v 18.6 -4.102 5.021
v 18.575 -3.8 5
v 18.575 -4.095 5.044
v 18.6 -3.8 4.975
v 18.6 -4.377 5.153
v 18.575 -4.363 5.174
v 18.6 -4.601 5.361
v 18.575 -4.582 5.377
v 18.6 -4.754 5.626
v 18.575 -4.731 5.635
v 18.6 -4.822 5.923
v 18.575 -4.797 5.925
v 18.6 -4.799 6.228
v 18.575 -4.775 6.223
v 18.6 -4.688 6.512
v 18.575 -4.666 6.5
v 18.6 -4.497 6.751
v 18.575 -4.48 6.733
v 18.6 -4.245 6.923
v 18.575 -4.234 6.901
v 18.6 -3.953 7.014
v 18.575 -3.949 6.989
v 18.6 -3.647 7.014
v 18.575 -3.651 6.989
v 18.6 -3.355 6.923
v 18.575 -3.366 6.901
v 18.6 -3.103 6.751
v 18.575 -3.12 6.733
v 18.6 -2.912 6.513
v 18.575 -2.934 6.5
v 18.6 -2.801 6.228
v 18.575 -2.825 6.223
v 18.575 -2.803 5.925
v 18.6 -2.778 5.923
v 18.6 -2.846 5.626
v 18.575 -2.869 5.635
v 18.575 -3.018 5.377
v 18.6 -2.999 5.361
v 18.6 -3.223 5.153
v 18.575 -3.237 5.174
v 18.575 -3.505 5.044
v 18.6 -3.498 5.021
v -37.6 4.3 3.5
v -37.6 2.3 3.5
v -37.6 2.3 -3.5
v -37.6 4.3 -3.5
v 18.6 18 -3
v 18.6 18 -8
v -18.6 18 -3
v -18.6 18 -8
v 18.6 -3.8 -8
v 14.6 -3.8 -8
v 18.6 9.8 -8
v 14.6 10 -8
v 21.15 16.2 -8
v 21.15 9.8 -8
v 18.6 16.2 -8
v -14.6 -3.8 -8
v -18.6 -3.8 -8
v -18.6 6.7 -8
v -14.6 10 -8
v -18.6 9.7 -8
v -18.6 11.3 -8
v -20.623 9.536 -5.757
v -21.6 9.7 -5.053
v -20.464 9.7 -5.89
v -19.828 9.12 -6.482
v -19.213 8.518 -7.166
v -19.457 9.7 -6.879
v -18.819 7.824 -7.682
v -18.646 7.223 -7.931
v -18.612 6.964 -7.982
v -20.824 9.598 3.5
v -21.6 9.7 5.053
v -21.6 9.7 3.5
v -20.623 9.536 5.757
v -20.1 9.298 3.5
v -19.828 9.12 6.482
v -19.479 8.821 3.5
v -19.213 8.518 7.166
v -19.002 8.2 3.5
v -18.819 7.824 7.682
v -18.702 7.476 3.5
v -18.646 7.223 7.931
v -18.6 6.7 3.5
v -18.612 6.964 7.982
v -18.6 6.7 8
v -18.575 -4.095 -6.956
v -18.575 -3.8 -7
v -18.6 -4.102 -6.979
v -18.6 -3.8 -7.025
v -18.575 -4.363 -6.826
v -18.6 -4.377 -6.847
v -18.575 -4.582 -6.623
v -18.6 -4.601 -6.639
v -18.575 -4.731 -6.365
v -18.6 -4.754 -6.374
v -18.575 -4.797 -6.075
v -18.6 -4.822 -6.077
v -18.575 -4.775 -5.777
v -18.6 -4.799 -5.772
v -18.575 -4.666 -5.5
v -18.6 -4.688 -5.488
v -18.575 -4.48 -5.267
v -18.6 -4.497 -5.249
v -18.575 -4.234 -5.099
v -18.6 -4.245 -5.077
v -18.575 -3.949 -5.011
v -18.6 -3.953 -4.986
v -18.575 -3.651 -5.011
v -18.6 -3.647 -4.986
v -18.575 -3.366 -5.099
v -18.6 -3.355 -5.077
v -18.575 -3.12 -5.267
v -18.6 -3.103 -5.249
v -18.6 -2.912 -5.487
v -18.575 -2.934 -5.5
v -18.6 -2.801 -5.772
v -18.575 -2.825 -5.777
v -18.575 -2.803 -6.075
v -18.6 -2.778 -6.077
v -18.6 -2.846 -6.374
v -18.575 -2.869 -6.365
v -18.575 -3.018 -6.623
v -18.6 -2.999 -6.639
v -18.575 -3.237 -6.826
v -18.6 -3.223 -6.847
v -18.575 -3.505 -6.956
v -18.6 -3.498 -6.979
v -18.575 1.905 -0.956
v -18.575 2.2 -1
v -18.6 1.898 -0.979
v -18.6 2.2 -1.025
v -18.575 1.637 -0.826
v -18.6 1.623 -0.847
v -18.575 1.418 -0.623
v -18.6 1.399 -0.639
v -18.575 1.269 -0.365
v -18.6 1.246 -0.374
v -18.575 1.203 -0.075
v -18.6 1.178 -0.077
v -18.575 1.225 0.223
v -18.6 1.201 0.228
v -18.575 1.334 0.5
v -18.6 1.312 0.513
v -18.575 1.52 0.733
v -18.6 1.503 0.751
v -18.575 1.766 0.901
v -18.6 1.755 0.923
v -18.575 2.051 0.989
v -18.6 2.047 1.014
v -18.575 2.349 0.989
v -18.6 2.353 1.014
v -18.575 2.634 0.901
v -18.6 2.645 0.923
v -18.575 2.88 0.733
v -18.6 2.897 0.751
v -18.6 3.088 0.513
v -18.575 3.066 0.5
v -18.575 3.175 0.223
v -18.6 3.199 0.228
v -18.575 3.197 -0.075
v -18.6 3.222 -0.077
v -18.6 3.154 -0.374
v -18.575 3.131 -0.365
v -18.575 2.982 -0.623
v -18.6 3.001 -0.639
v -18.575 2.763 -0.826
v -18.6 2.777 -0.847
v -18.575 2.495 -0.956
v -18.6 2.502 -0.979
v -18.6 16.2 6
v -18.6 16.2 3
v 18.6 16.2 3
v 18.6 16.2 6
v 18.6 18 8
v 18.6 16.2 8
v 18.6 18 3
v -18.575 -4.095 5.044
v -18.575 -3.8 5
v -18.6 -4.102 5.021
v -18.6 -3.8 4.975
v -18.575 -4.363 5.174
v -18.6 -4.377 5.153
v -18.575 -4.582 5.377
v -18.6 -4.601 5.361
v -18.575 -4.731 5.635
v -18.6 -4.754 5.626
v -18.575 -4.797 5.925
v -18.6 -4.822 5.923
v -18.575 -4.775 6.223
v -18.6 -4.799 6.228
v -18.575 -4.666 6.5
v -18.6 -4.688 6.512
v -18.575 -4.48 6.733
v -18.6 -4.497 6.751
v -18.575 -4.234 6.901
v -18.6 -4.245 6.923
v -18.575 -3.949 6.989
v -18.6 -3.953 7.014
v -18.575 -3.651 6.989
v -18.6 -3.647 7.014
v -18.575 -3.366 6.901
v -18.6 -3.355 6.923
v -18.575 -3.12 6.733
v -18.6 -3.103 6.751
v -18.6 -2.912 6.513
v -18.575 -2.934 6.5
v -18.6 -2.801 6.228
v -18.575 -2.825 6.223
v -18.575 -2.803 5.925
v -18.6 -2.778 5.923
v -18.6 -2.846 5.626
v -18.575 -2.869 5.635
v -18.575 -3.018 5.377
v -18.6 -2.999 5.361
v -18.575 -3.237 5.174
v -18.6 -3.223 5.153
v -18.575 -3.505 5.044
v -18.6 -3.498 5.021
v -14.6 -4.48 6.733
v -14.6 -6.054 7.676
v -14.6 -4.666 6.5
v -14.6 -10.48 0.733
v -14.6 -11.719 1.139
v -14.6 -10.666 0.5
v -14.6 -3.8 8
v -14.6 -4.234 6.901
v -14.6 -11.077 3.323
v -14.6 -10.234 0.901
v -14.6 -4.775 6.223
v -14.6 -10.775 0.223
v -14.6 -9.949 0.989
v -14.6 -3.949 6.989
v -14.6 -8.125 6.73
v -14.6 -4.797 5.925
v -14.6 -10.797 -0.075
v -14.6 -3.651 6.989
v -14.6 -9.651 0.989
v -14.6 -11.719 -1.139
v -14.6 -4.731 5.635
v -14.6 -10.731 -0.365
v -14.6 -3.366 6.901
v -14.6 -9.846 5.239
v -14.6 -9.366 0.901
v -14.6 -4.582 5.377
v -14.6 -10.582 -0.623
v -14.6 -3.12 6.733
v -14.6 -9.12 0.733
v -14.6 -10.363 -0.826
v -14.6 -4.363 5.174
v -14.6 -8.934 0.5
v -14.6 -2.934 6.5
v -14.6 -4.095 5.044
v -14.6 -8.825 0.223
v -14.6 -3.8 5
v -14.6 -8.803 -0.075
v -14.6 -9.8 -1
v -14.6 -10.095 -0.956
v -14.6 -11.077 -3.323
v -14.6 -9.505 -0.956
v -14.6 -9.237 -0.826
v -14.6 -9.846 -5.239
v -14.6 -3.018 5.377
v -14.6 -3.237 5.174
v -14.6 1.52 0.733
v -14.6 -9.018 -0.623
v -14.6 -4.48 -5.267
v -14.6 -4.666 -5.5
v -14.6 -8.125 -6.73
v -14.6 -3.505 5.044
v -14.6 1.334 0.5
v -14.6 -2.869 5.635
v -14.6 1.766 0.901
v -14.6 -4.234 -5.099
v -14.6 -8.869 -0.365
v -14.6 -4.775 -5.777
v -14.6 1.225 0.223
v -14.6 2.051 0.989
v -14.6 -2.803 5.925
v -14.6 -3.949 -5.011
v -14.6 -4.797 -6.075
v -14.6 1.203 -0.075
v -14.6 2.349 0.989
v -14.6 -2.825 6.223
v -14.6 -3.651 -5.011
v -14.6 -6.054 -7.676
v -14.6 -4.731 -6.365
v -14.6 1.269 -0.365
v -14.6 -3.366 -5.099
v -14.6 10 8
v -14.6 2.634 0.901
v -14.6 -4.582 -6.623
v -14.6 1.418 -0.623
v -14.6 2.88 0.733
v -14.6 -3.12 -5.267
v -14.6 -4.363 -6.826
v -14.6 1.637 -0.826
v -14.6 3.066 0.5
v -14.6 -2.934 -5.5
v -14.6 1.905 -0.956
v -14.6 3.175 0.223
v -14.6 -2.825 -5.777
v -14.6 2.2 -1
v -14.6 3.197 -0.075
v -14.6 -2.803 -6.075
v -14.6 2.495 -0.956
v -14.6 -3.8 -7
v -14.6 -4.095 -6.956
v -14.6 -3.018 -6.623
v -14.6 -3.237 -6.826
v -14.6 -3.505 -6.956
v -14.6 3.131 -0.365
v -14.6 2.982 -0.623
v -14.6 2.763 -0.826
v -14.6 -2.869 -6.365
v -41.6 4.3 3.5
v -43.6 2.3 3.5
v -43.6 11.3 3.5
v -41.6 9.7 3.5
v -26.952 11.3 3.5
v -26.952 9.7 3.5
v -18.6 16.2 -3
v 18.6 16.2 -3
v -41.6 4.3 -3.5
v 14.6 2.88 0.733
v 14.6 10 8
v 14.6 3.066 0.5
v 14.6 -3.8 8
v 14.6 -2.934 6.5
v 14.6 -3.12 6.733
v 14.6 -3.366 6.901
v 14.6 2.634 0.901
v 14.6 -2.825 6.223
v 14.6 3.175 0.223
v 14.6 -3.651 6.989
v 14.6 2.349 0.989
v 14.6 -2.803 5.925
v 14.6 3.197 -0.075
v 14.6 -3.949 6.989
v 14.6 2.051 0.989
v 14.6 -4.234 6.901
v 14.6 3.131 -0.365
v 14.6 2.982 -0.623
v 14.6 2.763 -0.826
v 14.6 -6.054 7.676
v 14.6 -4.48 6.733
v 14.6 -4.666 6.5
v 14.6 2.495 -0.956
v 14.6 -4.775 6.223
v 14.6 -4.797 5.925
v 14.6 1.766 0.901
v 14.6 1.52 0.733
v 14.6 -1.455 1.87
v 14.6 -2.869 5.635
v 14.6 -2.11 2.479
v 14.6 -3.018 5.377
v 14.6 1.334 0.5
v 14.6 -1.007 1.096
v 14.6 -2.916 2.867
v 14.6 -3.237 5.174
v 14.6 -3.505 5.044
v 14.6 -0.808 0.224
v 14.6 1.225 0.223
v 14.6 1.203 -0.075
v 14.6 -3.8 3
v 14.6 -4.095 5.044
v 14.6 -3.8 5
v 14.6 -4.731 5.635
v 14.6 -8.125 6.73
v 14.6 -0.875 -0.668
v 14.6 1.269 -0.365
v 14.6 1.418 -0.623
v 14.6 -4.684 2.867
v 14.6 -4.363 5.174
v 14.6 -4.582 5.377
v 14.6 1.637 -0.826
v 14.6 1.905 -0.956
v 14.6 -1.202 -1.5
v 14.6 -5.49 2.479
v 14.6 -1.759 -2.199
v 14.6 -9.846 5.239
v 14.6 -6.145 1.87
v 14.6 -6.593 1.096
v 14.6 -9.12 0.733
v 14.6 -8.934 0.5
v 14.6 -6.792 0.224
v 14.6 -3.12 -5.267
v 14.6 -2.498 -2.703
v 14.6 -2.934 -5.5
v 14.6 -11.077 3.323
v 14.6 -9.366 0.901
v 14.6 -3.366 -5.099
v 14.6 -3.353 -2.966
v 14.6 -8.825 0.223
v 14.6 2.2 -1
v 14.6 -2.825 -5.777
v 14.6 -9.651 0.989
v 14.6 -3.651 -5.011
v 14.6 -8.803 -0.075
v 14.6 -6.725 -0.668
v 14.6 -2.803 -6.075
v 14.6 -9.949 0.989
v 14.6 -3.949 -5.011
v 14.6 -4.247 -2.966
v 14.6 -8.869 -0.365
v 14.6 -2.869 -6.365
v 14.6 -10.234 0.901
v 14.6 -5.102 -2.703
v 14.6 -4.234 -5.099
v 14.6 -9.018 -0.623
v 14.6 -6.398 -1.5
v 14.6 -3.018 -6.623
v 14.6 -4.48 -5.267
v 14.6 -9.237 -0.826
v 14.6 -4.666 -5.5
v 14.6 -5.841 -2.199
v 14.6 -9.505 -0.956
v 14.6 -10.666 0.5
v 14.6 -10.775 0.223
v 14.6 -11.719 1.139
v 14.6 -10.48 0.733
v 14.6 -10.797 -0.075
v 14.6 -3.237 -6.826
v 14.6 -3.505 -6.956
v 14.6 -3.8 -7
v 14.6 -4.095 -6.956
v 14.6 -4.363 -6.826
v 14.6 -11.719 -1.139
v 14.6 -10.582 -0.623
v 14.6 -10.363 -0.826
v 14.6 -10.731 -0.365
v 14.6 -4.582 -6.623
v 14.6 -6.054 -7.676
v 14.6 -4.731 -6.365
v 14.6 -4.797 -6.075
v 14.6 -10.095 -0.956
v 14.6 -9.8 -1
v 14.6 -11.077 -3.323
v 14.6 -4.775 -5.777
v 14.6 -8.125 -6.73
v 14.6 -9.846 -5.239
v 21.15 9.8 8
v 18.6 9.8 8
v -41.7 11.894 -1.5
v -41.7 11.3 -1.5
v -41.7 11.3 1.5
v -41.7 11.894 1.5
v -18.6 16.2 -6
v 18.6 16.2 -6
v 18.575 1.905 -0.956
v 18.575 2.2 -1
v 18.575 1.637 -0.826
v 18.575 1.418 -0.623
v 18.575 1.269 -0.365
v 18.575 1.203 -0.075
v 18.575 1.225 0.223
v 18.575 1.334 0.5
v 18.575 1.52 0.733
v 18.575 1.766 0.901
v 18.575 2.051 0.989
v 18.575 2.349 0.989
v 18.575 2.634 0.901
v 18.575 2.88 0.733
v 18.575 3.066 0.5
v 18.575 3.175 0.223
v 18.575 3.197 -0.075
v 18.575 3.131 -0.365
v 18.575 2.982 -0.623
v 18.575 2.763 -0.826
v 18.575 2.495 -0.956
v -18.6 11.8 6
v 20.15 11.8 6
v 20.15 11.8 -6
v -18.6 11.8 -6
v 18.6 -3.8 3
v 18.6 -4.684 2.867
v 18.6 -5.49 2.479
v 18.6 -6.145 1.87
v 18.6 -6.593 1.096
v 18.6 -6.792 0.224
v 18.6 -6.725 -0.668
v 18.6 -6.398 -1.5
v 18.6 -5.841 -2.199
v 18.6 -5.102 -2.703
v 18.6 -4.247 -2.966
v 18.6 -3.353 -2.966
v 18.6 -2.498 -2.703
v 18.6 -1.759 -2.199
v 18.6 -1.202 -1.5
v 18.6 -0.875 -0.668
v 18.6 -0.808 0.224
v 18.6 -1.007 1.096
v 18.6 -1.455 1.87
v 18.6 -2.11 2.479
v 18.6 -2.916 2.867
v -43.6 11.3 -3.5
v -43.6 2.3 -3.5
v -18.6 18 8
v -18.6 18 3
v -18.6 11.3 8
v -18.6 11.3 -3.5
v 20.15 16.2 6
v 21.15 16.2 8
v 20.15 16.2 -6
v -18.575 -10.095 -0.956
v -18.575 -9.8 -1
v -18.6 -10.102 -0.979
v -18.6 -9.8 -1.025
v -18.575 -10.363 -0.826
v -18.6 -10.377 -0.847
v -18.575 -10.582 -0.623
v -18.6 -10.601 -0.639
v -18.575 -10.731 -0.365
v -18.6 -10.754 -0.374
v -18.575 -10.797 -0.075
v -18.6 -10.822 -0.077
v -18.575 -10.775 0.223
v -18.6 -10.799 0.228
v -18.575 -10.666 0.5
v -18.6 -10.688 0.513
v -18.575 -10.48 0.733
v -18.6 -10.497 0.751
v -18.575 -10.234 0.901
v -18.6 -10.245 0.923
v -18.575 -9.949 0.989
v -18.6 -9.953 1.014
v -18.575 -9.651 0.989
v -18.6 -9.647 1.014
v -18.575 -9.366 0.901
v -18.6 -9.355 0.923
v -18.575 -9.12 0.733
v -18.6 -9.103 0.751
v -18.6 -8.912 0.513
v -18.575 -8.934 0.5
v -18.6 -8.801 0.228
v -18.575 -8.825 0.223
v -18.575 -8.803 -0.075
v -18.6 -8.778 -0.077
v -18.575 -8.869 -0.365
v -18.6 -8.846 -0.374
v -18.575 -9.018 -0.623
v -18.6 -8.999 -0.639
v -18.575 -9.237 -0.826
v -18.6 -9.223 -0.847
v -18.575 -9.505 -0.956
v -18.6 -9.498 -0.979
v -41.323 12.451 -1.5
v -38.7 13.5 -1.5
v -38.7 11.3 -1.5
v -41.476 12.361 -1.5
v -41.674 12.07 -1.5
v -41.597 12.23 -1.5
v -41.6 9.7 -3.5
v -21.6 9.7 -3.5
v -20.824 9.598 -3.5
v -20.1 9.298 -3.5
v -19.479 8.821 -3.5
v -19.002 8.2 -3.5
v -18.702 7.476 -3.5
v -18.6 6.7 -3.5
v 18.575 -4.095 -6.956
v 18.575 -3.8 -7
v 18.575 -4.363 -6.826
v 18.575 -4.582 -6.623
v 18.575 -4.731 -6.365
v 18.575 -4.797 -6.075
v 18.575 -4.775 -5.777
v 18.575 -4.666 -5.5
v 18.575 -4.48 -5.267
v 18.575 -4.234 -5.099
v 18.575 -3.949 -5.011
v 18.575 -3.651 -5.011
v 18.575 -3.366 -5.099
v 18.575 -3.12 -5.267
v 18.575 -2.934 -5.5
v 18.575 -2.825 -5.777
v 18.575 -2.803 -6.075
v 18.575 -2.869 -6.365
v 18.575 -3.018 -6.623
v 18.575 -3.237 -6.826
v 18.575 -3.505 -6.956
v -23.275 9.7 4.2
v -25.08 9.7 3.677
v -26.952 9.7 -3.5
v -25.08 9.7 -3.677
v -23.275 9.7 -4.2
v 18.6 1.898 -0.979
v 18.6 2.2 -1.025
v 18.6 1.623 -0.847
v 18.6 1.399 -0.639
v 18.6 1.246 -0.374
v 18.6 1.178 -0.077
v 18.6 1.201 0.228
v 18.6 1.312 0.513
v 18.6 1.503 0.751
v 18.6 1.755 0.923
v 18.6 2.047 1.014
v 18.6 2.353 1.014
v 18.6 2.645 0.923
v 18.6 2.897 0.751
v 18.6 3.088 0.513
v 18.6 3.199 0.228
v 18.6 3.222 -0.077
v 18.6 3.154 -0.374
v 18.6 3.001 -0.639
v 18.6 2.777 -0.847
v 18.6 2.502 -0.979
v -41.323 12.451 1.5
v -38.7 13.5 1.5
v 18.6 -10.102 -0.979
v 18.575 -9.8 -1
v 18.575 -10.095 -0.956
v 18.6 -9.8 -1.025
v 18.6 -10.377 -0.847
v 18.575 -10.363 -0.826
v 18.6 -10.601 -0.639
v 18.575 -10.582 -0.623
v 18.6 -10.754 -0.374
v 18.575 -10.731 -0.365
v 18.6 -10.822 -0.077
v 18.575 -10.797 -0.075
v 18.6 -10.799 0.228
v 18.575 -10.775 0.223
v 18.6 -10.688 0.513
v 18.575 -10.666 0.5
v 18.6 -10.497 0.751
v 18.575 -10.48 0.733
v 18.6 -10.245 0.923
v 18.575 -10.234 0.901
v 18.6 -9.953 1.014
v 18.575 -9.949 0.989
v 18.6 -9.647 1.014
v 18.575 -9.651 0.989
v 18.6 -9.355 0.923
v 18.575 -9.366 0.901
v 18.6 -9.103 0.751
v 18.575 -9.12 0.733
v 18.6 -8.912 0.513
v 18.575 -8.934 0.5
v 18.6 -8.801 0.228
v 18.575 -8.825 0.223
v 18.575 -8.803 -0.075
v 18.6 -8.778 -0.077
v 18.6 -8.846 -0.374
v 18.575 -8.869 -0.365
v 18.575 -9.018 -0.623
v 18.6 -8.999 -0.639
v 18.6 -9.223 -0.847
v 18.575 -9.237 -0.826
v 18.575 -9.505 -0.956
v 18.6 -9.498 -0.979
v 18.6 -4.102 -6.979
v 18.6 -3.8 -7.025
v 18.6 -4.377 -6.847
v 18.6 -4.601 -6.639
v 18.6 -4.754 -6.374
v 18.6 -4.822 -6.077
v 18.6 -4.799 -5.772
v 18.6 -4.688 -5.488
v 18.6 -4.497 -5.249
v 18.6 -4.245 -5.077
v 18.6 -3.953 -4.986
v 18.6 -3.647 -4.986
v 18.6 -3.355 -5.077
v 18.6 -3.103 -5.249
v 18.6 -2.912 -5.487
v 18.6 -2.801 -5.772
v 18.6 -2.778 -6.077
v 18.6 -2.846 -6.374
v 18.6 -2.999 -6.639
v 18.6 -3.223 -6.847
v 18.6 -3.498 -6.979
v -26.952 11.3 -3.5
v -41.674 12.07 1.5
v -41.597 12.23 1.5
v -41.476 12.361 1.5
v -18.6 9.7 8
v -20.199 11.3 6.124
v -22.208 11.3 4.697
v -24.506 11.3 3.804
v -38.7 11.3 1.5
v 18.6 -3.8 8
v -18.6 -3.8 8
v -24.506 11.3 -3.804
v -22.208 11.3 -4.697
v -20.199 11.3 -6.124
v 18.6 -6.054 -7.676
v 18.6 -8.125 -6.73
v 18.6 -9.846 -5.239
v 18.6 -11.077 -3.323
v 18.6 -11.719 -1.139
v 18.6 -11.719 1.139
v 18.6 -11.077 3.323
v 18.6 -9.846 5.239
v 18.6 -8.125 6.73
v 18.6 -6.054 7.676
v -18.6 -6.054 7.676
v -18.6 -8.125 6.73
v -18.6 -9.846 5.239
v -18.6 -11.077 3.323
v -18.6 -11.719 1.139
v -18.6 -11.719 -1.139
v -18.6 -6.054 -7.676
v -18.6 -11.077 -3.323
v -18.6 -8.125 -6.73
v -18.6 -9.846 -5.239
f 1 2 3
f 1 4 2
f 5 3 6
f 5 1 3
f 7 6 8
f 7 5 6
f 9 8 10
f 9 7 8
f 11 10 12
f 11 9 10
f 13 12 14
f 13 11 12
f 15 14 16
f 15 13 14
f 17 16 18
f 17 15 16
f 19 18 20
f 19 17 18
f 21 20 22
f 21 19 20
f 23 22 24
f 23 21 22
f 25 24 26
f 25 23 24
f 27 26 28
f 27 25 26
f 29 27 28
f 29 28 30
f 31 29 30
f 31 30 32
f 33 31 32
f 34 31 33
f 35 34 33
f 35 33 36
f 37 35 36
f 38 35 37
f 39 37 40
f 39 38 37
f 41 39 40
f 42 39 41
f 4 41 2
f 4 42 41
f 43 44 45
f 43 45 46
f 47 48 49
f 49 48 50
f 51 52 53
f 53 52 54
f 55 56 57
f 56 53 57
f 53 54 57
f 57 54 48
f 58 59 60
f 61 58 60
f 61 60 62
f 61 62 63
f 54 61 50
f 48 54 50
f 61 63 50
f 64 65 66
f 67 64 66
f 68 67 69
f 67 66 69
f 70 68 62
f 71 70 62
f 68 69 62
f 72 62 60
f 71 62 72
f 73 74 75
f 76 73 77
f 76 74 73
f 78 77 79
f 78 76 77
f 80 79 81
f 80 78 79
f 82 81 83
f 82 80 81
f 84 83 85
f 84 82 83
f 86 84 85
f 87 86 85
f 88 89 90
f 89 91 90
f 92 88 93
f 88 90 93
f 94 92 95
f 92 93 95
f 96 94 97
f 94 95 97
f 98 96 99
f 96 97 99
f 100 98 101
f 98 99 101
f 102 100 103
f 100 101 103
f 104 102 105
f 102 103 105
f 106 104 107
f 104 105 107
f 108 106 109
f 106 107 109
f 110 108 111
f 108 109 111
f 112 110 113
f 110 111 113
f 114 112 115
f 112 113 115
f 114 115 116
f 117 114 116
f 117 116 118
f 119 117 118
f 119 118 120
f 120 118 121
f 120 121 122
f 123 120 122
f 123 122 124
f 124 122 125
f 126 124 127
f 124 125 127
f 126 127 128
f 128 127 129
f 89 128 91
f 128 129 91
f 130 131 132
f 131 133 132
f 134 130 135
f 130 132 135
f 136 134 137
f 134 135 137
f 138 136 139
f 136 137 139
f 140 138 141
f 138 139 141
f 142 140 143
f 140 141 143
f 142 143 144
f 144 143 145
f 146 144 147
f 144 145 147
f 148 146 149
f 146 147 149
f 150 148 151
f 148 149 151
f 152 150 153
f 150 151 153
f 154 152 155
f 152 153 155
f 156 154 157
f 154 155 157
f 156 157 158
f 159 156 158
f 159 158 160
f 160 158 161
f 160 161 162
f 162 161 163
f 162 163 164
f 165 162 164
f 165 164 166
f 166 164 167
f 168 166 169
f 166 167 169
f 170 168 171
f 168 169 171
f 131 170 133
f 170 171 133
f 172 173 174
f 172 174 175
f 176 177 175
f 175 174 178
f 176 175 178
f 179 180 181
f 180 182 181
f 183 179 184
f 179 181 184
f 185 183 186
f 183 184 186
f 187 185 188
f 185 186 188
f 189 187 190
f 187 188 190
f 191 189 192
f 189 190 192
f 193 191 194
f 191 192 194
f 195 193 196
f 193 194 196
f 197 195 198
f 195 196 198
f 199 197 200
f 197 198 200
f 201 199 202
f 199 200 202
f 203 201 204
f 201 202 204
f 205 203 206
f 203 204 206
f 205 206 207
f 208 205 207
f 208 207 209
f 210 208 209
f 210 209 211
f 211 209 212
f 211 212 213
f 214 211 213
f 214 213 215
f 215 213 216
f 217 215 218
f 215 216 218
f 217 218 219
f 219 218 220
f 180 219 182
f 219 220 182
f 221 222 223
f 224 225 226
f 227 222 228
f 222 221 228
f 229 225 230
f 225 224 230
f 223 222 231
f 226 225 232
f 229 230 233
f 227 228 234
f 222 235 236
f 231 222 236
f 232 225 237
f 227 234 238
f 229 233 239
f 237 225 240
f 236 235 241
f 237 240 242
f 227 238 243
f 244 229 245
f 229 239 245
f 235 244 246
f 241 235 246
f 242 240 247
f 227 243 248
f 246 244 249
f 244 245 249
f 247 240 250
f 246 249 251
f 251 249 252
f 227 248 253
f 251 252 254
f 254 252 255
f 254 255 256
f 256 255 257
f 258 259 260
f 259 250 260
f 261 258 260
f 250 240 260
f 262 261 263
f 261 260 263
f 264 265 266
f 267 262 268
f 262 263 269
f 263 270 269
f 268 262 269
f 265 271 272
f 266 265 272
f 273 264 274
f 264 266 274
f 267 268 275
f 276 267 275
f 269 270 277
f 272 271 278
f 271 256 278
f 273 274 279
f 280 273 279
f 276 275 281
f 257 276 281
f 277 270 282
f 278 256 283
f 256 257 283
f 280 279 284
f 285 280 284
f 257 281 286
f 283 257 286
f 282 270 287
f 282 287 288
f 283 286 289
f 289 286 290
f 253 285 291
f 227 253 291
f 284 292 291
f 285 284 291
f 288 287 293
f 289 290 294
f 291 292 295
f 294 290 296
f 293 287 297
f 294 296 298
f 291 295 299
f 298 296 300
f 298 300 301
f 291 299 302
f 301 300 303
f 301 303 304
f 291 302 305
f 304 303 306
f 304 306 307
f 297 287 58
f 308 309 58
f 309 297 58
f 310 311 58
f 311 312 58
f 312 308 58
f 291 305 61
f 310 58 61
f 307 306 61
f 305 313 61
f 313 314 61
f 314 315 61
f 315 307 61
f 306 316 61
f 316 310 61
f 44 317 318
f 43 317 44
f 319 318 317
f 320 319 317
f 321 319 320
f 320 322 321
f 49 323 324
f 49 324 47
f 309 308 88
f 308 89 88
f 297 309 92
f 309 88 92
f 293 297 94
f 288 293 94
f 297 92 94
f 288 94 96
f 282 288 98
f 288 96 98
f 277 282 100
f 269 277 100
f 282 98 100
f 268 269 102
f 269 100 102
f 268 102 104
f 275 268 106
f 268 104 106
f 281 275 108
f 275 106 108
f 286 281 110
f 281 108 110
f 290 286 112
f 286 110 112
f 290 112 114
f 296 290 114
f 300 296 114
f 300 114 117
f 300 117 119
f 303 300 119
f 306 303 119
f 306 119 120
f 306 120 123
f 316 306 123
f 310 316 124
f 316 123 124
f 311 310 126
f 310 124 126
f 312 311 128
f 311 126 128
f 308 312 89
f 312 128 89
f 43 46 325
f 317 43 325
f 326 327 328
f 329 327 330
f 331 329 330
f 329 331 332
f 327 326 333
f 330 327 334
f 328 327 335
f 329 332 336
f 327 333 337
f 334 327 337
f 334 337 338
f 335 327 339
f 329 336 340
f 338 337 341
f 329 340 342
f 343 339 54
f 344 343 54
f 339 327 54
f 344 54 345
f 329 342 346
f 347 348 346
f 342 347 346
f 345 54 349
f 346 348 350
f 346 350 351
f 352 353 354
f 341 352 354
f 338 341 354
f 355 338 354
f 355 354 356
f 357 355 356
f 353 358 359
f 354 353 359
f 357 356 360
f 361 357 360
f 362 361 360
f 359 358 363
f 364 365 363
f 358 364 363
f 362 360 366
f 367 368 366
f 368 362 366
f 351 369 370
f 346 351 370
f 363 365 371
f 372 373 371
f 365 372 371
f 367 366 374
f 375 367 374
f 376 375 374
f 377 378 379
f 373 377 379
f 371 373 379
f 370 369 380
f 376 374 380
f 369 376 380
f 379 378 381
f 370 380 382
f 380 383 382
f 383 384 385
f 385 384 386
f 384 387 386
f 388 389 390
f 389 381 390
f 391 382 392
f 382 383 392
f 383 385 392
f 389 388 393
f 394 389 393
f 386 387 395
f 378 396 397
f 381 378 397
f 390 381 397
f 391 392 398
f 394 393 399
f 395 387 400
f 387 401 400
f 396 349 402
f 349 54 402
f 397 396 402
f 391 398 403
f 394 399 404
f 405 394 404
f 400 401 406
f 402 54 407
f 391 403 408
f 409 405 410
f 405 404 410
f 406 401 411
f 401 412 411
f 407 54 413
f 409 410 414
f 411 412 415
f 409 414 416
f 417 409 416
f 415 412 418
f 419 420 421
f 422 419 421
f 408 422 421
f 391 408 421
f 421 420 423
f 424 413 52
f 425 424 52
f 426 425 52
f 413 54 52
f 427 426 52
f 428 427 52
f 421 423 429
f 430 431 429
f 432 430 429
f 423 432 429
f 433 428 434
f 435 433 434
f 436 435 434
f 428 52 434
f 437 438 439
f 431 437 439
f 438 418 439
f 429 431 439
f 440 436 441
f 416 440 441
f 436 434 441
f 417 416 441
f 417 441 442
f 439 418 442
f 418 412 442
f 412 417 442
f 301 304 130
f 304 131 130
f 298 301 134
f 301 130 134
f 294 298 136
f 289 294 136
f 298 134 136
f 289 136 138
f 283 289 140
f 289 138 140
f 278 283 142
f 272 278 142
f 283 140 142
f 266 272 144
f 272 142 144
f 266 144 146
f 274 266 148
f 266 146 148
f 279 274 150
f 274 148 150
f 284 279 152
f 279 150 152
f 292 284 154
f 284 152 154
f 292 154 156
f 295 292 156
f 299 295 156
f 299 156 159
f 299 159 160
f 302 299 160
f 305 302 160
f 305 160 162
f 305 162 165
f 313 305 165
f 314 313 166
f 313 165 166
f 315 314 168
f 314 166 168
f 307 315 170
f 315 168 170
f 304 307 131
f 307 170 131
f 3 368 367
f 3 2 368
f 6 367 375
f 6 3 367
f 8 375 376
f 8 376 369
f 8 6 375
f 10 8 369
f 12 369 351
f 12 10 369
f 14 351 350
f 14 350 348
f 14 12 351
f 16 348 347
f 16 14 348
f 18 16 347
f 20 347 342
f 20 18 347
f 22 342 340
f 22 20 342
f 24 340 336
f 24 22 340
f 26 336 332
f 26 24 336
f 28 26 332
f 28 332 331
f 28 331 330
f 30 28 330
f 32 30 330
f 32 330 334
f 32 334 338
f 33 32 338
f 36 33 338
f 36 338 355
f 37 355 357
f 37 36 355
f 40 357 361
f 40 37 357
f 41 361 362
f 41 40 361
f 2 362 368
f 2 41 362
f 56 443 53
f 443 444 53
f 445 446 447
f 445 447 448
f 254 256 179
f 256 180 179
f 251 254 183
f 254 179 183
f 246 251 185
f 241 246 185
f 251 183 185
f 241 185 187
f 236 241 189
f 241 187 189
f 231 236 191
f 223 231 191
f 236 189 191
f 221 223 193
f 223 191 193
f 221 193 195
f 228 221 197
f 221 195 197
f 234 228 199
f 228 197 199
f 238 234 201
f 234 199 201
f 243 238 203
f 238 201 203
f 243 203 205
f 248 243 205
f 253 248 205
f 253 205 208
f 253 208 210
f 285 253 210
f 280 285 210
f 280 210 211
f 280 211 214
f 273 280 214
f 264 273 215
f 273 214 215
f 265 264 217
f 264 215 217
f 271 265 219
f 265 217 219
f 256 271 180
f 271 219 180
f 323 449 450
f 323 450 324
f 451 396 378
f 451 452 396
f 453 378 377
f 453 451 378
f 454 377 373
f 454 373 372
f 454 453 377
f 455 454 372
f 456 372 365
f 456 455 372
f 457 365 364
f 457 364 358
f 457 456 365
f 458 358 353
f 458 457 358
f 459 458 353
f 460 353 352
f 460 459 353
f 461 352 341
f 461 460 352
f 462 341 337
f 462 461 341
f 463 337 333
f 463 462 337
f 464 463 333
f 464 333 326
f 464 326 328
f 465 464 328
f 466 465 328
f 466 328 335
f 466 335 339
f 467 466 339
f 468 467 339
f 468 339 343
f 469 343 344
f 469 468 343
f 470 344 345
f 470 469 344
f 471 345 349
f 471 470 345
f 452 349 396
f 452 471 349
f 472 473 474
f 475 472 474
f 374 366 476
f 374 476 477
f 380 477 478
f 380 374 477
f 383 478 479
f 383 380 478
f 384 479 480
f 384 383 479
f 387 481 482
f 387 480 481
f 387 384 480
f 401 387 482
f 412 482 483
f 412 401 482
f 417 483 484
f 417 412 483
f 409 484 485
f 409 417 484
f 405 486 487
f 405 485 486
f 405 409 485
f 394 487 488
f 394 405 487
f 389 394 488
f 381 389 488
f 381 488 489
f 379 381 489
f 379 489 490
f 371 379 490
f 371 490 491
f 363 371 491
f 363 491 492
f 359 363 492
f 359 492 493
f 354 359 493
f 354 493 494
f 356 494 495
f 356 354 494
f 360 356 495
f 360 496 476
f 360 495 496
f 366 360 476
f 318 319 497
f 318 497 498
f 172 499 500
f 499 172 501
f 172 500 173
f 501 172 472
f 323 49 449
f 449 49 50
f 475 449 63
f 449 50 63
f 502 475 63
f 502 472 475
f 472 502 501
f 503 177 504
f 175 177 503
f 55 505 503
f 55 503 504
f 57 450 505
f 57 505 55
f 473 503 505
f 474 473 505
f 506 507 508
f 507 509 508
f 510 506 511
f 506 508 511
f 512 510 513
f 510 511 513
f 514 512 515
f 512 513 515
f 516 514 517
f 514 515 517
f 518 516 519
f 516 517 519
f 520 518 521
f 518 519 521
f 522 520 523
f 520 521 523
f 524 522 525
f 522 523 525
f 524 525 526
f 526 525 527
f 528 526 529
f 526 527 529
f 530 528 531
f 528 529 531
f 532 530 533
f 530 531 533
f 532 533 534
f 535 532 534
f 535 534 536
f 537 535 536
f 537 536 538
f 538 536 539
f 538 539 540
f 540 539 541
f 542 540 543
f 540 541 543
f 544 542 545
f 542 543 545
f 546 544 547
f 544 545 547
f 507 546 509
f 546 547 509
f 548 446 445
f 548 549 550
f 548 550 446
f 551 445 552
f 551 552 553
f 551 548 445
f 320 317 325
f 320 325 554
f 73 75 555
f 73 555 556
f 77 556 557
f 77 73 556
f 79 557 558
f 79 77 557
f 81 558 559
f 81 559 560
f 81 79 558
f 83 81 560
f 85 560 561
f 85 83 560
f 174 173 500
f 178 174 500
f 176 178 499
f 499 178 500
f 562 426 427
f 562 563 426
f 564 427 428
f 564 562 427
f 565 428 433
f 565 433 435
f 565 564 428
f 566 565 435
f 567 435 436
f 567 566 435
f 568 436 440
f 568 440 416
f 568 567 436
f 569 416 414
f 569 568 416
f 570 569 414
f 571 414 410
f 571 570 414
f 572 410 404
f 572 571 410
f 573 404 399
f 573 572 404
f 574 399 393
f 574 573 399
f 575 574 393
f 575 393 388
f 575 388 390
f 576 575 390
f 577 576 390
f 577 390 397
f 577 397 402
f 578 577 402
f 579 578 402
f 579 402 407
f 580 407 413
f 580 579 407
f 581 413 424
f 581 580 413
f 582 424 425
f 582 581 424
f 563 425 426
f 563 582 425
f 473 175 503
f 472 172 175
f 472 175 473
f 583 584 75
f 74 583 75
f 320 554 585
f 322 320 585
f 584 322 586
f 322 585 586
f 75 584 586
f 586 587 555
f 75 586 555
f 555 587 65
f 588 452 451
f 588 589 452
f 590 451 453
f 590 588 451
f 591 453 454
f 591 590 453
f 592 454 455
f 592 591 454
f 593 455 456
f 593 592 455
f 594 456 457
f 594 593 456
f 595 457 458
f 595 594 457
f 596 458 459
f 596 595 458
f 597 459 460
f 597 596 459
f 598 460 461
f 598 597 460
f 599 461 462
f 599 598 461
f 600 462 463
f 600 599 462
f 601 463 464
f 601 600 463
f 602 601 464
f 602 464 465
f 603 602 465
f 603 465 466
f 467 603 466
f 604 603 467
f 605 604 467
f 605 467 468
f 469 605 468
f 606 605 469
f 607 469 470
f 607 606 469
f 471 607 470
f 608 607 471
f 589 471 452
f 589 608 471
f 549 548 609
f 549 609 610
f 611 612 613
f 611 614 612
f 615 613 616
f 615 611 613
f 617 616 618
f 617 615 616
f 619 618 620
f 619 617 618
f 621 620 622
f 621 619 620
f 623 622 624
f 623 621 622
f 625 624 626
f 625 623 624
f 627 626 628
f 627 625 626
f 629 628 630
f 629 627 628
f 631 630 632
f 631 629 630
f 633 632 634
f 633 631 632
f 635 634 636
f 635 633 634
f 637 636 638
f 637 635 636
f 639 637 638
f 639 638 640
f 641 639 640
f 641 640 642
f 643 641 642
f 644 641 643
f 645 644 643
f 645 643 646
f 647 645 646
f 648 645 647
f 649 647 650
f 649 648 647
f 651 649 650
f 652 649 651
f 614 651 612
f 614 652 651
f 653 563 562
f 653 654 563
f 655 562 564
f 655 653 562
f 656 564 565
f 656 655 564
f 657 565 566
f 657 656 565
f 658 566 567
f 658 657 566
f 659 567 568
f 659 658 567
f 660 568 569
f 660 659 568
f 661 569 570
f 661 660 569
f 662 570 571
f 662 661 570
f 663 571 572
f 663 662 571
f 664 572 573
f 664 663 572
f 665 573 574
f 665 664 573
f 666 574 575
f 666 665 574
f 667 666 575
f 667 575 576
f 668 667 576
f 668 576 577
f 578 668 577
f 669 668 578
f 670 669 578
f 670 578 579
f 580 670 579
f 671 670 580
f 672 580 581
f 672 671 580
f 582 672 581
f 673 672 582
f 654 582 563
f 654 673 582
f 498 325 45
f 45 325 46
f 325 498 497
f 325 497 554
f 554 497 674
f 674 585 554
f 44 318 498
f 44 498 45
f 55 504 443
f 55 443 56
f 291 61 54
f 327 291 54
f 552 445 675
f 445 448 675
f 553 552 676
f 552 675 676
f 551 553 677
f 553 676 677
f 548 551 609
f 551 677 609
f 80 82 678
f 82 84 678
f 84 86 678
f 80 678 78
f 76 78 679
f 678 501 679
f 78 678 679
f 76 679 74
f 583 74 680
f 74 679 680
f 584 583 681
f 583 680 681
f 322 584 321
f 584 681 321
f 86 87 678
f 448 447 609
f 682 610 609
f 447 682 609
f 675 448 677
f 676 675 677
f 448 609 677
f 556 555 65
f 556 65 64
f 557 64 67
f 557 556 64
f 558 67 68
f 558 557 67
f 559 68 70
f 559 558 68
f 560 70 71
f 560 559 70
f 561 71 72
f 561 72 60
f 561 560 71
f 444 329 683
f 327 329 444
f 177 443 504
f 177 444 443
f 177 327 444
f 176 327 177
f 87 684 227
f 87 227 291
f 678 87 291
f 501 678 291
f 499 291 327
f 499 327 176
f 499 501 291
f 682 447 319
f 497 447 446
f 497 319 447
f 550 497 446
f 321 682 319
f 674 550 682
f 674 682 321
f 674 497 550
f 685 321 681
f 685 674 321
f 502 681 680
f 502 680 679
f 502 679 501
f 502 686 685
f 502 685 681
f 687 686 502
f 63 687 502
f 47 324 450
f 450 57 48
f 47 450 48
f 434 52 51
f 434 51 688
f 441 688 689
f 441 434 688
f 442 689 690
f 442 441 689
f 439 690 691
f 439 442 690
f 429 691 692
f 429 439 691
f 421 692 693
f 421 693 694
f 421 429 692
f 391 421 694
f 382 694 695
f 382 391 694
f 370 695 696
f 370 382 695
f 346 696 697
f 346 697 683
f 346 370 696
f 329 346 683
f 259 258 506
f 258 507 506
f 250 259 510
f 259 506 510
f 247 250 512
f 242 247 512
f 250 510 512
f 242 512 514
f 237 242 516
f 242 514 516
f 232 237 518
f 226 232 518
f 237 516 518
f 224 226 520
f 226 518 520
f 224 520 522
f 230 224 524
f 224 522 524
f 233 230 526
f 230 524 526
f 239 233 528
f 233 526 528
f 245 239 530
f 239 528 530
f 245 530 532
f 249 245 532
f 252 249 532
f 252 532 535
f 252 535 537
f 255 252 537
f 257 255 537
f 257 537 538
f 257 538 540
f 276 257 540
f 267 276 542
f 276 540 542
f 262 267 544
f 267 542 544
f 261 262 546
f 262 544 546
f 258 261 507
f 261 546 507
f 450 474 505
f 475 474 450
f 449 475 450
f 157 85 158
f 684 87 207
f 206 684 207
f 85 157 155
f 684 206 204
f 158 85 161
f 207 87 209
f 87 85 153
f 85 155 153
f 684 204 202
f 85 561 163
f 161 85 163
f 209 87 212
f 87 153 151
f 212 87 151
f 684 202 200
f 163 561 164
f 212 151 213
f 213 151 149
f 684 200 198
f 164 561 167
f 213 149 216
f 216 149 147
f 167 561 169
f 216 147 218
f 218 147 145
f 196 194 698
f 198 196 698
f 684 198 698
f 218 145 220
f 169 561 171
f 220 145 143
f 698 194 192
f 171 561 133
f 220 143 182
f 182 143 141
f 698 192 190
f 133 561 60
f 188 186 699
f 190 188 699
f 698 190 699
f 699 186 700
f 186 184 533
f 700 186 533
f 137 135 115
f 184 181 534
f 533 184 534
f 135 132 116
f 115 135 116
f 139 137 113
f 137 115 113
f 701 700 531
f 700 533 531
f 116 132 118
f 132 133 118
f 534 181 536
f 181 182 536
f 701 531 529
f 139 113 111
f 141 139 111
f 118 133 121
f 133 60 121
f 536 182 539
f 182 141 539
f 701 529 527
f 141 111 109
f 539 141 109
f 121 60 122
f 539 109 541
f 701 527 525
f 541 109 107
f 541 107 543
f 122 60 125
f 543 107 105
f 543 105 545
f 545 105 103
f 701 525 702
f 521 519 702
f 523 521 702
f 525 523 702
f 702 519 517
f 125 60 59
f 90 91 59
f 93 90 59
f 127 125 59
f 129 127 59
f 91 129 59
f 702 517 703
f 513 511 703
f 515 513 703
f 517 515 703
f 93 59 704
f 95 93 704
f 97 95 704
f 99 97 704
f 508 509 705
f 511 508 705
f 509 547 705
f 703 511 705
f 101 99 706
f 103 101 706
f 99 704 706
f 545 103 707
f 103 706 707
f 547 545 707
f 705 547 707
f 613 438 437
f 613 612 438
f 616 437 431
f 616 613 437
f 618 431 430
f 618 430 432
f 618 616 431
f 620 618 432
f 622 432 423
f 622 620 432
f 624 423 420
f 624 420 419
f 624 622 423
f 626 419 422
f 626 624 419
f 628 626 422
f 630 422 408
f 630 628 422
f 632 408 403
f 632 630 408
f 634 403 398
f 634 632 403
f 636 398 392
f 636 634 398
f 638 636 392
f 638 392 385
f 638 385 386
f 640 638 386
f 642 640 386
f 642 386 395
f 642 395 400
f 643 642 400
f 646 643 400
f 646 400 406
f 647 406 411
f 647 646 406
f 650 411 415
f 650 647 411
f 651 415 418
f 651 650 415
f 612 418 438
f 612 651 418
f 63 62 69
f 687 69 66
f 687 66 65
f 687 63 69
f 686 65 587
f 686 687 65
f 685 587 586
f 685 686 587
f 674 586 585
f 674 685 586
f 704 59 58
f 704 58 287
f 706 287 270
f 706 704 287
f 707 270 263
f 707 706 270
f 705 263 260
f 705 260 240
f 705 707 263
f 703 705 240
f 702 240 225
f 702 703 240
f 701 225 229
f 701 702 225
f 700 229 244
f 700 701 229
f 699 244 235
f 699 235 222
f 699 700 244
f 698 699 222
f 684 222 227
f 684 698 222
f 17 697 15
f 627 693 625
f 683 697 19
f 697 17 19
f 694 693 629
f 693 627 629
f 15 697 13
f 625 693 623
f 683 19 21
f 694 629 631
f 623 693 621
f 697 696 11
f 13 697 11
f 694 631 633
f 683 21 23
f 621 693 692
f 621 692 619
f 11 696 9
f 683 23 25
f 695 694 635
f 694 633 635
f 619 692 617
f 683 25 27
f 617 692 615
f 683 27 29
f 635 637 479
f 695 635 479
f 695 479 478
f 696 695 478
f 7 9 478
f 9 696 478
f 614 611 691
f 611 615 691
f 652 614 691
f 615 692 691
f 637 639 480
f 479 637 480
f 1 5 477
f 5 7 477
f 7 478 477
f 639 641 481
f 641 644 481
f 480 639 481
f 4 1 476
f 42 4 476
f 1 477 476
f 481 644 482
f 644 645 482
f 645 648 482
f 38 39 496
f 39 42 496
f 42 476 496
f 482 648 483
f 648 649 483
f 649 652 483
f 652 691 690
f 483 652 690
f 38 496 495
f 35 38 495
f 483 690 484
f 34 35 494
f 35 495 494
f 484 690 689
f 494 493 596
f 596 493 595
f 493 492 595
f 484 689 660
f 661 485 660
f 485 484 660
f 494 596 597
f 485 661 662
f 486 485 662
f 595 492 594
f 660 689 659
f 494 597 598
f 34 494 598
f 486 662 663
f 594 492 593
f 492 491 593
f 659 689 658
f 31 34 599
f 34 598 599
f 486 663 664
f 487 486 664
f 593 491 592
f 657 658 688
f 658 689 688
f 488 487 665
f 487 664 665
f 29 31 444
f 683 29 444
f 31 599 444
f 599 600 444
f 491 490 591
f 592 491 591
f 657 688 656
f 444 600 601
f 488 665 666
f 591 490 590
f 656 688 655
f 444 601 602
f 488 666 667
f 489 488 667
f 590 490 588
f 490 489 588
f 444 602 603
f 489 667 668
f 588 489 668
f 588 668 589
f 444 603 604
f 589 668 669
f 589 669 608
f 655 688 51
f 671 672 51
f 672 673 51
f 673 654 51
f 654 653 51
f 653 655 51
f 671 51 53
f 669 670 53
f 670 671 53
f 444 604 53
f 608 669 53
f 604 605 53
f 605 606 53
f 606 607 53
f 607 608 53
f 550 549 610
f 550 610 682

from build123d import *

# Parameters (mm, degrees)
BOSS_EXTRUDE1_DEPTH             = 8
BOSS_EXTRUDE1_DEPTH_BACK        = 8
M1_6_CLEARANCE_HOLE1_AT_2_COUNT = 2
M1_6_CLEARANCE_HOLE1_AT_2_PITCH = 8.485281374
M1_6_CLEARANCE_HOLE1_AT_3_COUNT = 2
M1_6_CLEARANCE_HOLE1_AT_3_PITCH = 12
M1_6_CLEARANCE_HOLE1_AT_4_COUNT = 2
M1_6_CLEARANCE_HOLE1_AT_4_PITCH = 8.485281374
CUT_EXTRUDE1_DEPTH              = 43.093229859
CUT_EXTRUDE1_DEPTH_BACK         = 43.093229859
CUT_EXTRUDE2_DEPTH              = 43.093229859
CUT_EXTRUDE2_DEPTH_BACK         = 43.093229859
SKETCH6_W                       = 6
SKETCH6_H                       = 1.8
SKETCH6_W_2                     = 12
SKETCH6_H_2                     = 4.4
BOSS_EXTRUDE2_START             = -0.5
SKETCH8_W                       = 23
SKETCH8_H                       = 7
BOSS_EXTRUDE2_DEPTH             = 1.6
BOSS_EXTRUDE3_DEPTH             = 7
BOSS_EXTRUDE4_DEPTH             = 1.55
SKETCH13_W                      = 16
SKETCH13_H                      = 6.4
BOSS_EXTRUDE5_DEPTH             = 1
BOSS_EXTRUDE6_DEPTH             = 1.5
BOSS_EXTRUDE6_DEPTH_BACK        = 1.5
FILLET1_R                       = 0.6
FILLET2_R                       = 10
FILLET3_R                       = 3
CUT_EXTRUDE3_DEPTH              = 66.244463379
CUT_EXTRUDE3_DEPTH_BACK         = 10
SKETCH16_R                      = 3


with BuildPart() as part:
    # Sketch1 → Boss-Extrude1 (new, two sides: drawn at the far end of the back side and taken through both)
    with BuildSketch(Plane.XY.offset(-BOSS_EXTRUDE1_DEPTH_BACK)):
        Polygon((18.6, 18), (-18.6, 18), (-18.6, -18), (-14.6, -18), (-14.6, 10), (14.6, 10), (14.6, -18), (18.6, -18), align=None)
    extrude(amount=BOSS_EXTRUDE1_DEPTH + BOSS_EXTRUDE1_DEPTH_BACK)

    # Sketch4 → M1.6 Clearance Hole1 (revolve, cut)
    with BuildSketch(Plane(origin=(18.6, -3.8, 6), x_dir=(0, 0, -1), z_dir=(0, 1, 0))):
        Polygon((0, 0), (0, 4.600860619), (1, 4), (1, 0.025), (1.025, 0), align=None)
    m1_6_clearance_hole1 = revolve(axis=Axis((24.95, -3.8, 6), (-1, 0, 0)), mode=Mode.SUBTRACT)

    # M1.6 Clearance Hole1 at 2: M1.6 Clearance Hole1 ×2
    with Locations(*[Vector(0, 0.7071067811865476, -0.7071067811865476) * (i * M1_6_CLEARANCE_HOLE1_AT_2_PITCH) for i in range(1, M1_6_CLEARANCE_HOLE1_AT_2_COUNT)]):
        add(m1_6_clearance_hole1, mode=Mode.SUBTRACT)

    # M1.6 Clearance Hole1 at 3: M1.6 Clearance Hole1 ×2
    with Locations(*[(0, 0, -i * M1_6_CLEARANCE_HOLE1_AT_3_PITCH) for i in range(1, M1_6_CLEARANCE_HOLE1_AT_3_COUNT)]):
        add(m1_6_clearance_hole1, mode=Mode.SUBTRACT)

    # M1.6 Clearance Hole1 at 4: M1.6 Clearance Hole1 ×2
    with Locations(*[Vector(0, -0.7071067811865475, -0.7071067811865476) * (i * M1_6_CLEARANCE_HOLE1_AT_4_PITCH) for i in range(1, M1_6_CLEARANCE_HOLE1_AT_4_COUNT)]):
        add(m1_6_clearance_hole1, mode=Mode.SUBTRACT)

    # Mirror1: M1.6 Clearance Hole1 across plane
    add(m1_6_clearance_hole1.mirror(Plane(origin=(0, 0, 0), x_dir=(0, 0, 1), z_dir=(1, 0, 0))), mode=Mode.SUBTRACT)

    # Mirror1 copy 1 sketch → Mirror1 copy 1 (revolve, cut)
    with BuildSketch(Plane(origin=(-18.6, 2.2, 0), x_dir=(0, 0, -1), z_dir=(0, 1, 0))):
        Polygon((0, 0), (0, -4.600860619), (1, -4), (1, -0.025), (1.025, 0), align=None)
    revolve(axis=Axis((-24.95, 2.2, 0), (-1, 0, 0)), mode=Mode.SUBTRACT)

    # Mirror1 copy 2 sketch → Mirror1 copy 2 (revolve, cut)
    with BuildSketch(Plane(origin=(-18.6, -3.8, -6), x_dir=(0, 0, -1), z_dir=(0, 1, 0))):
        Polygon((0, 0), (0, -4.600860619), (1, -4), (1, -0.025), (1.025, 0), align=None)
    revolve(axis=Axis((-24.95, -3.8, -6), (-1, 0, 0)), mode=Mode.SUBTRACT)

    # Mirror1 copy 3 sketch → Mirror1 copy 3 (revolve, cut)
    with BuildSketch(Plane(origin=(-18.6, -9.8, 0), x_dir=(0, 0, -1), z_dir=(0, 1, 0))):
        Polygon((0, 0), (0, -4.600860619), (1, -4), (1, -0.025), (1.025, 0), align=None)
    revolve(axis=Axis((-24.95, -9.8, 0), (-1, 0, 0)), mode=Mode.SUBTRACT)

    # Sketch5 → Cut-Extrude1 (cut, two sides: drawn at the far end of the back side and taken through both)
    with BuildSketch(Plane(origin=(18.6, 0, 0), x_dir=(0, 0, -1), z_dir=(1, 0, 0)).offset(-CUT_EXTRUDE1_DEPTH_BACK)):
        with BuildLine():
            Line((-8, -3.8), (-8, -18))
            Line((-8, -18), (8, -18))
            Line((8, -18), (8, -3.8))
            ThreePointArc((8, -3.8), (0, -11.8), (-8, -3.8))
        make_face()
    extrude(amount=CUT_EXTRUDE1_DEPTH + CUT_EXTRUDE1_DEPTH_BACK, mode=Mode.SUBTRACT)

    # Sketch6 → Cut-Extrude2 (cut, two sides: drawn at the far end of the back side and taken through both)
    with BuildSketch(Plane.ZY.offset(18.6).offset(-CUT_EXTRUDE2_DEPTH_BACK)):
        with Locations((0, 17.1)):
            Rectangle(SKETCH6_W, SKETCH6_H)
        with Locations((0, 14)):
            Rectangle(SKETCH6_W_2, SKETCH6_H_2)
    extrude(amount=CUT_EXTRUDE2_DEPTH + CUT_EXTRUDE2_DEPTH_BACK, mode=Mode.SUBTRACT)

    # Sketch8 → Boss-Extrude2 (add)
    with BuildSketch(Plane(origin=(0, 11.8, 0), x_dir=(1, 0, 0), z_dir=(0, 1, 0)).offset(BOSS_EXTRUDE2_START)):
        with Locations((-30.1, 0)):
            Rectangle(SKETCH8_W, SKETCH8_H)
    extrude(amount=-BOSS_EXTRUDE2_DEPTH)

    # Sketch10 → Boss-Extrude3 (add)
    with BuildSketch(Plane.XY.offset(3.5)):
        Polygon((-41.6, 11.3), (-43.6, 11.3), (-43.6, 2.3), (-37.6, 2.3), (-37.6, 4.3), (-41.6, 4.3), align=None)
    extrude(amount=-BOSS_EXTRUDE3_DEPTH)

    # Sketch12 → Boss-Extrude4 (add)
    with BuildSketch(Plane(origin=(18.6, 0, 0), x_dir=(0, 0, -1), z_dir=(1, 0, 0))):
        Polygon((6, 11.8), (6, 16.2), (8, 16.2), (8, 9.8), (-8, 9.8), (-8, 16.2), (-6, 16.2), (-6, 11.8), align=None)
    extrude(amount=BOSS_EXTRUDE4_DEPTH)

    # Sketch13 → Boss-Extrude5 (add)
    with BuildSketch(Plane(origin=(20.15, 0, 0), x_dir=(0, 0, -1), z_dir=(1, 0, 0))):
        with Locations((0, 13)):
            Rectangle(SKETCH13_W, SKETCH13_H)
    extrude(amount=BOSS_EXTRUDE5_DEPTH)

    # Sketch14 → Boss-Extrude6 (add, two sides: drawn at the far end of the back side and taken through both)
    with BuildSketch(Plane.XY.offset(-BOSS_EXTRUDE6_DEPTH_BACK)):
        Polygon((-41.7, 11.3), (-41.7, 12.3), (-38.7, 13.5), (-38.7, 11.3), align=None)
    extrude(amount=BOSS_EXTRUDE6_DEPTH + BOSS_EXTRUDE6_DEPTH_BACK)

    # Fillet1
    fillet1_edges = [part.edges().sort_by_distance(p)[0] for p in [
        (-41.7, 12.3, 0),
    ]]
    fillet(fillet1_edges, radius=FILLET1_R)

    # Fillet2
    # the kernel refuses this fillet: 10 mm, written as the material it adds along each edge
    with BuildSketch(Plane(origin=(-18.6, 11.3, -3.5), x_dir=(-1.5292458657399207e-12, 0, -1.0), z_dir=(0, -1, 0))) as fillet2_piece_1:
        with BuildLine():
            CenterArc((10, -8.351646544), FILLET2_R, 123.367012969, 56.632987031)
            Line((0, -8.351646544), (0, 0))
            Line((0, 0), (4.5, 0))
        make_face()
    extrude(amount=1.6)
    with BuildSketch(Plane(origin=(-18.6, 11.3, 3.5), x_dir=(-1, 0, 0), z_dir=(0, -1, 0))) as fillet2_piece_2:
        with BuildLine():
            CenterArc((8.351646544, -10), FILLET2_R, 90, 56.632987031)
            Line((0, -4.5), (0, 0))
            Line((0, 0), (8.351646544, 0))
        make_face()
    extrude(amount=1.6)

    # Fillet3
    # the kernel refuses this fillet: 3 mm, written as the material it adds along each edge
    with BuildSketch(Plane(origin=(-18.6, 9.7, 3.5), x_dir=(-1, 0, 0), z_dir=(0, 0, -1))) as fillet3_piece_1:
        with BuildLine():
            CenterArc((FILLET3_R, -FILLET3_R), FILLET3_R, 90, 90)
            Line((0, -FILLET3_R), (0, 0))
            Line((0, 0), (FILLET3_R, 0))
        make_face()
    extrude(amount=7)
    with BuildSketch(Plane(origin=(-18.6, 9.7, 8), x_dir=(-1.0, 0, -1.5555555555538275e-12), z_dir=(1.5555555555538273e-12, 0, -1.0))) as fillet3_piece_2_section:
        with BuildLine():
            CenterArc((FILLET3_R, -FILLET3_R), FILLET3_R, 90, 90)
            Line((0, -FILLET3_R), (0, 0))
            Line((0, 0), (FILLET3_R, 0))
        make_face()
    fillet3_piece_2 = extrude(amount=4.5, mode=Mode.PRIVATE)
    fillet3_piece_2 = fillet3_piece_2 - Plane(origin=(-26.951646544, 8.943750406, 13.5), x_dir=(-1, 0, 0), z_dir=(0, 1, 0)) * Cylinder(10, 22, mode=Mode.PRIVATE)
    add(fillet3_piece_2)
    with BuildSketch(Plane(origin=(-18.6, 9.7, -3.5), x_dir=(-1.0, 0, 2e-12), z_dir=(-2e-12, 0, -1.0))) as fillet3_piece_3_section:
        with BuildLine():
            CenterArc((FILLET3_R, -FILLET3_R), FILLET3_R, 90, 90)
            Line((0, -FILLET3_R), (0, 0))
            Line((0, 0), (FILLET3_R, 0))
        make_face()
    fillet3_piece_3 = extrude(amount=4.5, mode=Mode.PRIVATE)
    fillet3_piece_3 = fillet3_piece_3 - Plane(origin=(-26.951646544, 8.943748833, -13.5), x_dir=(-2e-12, 0, -1.0), z_dir=(0, 1, 0)) * Cylinder(10, 22, mode=Mode.PRIVATE)
    add(fillet3_piece_3)

    # Sketch16 → Cut-Extrude3 (cut, two sides: drawn at the far end of the back side and taken through both)
    with BuildSketch(Plane(origin=(18.6, 0, 0), x_dir=(0, 0, -1), z_dir=(1, 0, 0)).offset(-CUT_EXTRUDE3_DEPTH_BACK)):
        with Locations(Location((0, -3.8, 0), (0, 0, 180))):
            Circle(SKETCH16_R)
    extrude(amount=CUT_EXTRUDE3_DEPTH + CUT_EXTRUDE3_DEPTH_BACK, mode=Mode.SUBTRACT)


solid = part.part
